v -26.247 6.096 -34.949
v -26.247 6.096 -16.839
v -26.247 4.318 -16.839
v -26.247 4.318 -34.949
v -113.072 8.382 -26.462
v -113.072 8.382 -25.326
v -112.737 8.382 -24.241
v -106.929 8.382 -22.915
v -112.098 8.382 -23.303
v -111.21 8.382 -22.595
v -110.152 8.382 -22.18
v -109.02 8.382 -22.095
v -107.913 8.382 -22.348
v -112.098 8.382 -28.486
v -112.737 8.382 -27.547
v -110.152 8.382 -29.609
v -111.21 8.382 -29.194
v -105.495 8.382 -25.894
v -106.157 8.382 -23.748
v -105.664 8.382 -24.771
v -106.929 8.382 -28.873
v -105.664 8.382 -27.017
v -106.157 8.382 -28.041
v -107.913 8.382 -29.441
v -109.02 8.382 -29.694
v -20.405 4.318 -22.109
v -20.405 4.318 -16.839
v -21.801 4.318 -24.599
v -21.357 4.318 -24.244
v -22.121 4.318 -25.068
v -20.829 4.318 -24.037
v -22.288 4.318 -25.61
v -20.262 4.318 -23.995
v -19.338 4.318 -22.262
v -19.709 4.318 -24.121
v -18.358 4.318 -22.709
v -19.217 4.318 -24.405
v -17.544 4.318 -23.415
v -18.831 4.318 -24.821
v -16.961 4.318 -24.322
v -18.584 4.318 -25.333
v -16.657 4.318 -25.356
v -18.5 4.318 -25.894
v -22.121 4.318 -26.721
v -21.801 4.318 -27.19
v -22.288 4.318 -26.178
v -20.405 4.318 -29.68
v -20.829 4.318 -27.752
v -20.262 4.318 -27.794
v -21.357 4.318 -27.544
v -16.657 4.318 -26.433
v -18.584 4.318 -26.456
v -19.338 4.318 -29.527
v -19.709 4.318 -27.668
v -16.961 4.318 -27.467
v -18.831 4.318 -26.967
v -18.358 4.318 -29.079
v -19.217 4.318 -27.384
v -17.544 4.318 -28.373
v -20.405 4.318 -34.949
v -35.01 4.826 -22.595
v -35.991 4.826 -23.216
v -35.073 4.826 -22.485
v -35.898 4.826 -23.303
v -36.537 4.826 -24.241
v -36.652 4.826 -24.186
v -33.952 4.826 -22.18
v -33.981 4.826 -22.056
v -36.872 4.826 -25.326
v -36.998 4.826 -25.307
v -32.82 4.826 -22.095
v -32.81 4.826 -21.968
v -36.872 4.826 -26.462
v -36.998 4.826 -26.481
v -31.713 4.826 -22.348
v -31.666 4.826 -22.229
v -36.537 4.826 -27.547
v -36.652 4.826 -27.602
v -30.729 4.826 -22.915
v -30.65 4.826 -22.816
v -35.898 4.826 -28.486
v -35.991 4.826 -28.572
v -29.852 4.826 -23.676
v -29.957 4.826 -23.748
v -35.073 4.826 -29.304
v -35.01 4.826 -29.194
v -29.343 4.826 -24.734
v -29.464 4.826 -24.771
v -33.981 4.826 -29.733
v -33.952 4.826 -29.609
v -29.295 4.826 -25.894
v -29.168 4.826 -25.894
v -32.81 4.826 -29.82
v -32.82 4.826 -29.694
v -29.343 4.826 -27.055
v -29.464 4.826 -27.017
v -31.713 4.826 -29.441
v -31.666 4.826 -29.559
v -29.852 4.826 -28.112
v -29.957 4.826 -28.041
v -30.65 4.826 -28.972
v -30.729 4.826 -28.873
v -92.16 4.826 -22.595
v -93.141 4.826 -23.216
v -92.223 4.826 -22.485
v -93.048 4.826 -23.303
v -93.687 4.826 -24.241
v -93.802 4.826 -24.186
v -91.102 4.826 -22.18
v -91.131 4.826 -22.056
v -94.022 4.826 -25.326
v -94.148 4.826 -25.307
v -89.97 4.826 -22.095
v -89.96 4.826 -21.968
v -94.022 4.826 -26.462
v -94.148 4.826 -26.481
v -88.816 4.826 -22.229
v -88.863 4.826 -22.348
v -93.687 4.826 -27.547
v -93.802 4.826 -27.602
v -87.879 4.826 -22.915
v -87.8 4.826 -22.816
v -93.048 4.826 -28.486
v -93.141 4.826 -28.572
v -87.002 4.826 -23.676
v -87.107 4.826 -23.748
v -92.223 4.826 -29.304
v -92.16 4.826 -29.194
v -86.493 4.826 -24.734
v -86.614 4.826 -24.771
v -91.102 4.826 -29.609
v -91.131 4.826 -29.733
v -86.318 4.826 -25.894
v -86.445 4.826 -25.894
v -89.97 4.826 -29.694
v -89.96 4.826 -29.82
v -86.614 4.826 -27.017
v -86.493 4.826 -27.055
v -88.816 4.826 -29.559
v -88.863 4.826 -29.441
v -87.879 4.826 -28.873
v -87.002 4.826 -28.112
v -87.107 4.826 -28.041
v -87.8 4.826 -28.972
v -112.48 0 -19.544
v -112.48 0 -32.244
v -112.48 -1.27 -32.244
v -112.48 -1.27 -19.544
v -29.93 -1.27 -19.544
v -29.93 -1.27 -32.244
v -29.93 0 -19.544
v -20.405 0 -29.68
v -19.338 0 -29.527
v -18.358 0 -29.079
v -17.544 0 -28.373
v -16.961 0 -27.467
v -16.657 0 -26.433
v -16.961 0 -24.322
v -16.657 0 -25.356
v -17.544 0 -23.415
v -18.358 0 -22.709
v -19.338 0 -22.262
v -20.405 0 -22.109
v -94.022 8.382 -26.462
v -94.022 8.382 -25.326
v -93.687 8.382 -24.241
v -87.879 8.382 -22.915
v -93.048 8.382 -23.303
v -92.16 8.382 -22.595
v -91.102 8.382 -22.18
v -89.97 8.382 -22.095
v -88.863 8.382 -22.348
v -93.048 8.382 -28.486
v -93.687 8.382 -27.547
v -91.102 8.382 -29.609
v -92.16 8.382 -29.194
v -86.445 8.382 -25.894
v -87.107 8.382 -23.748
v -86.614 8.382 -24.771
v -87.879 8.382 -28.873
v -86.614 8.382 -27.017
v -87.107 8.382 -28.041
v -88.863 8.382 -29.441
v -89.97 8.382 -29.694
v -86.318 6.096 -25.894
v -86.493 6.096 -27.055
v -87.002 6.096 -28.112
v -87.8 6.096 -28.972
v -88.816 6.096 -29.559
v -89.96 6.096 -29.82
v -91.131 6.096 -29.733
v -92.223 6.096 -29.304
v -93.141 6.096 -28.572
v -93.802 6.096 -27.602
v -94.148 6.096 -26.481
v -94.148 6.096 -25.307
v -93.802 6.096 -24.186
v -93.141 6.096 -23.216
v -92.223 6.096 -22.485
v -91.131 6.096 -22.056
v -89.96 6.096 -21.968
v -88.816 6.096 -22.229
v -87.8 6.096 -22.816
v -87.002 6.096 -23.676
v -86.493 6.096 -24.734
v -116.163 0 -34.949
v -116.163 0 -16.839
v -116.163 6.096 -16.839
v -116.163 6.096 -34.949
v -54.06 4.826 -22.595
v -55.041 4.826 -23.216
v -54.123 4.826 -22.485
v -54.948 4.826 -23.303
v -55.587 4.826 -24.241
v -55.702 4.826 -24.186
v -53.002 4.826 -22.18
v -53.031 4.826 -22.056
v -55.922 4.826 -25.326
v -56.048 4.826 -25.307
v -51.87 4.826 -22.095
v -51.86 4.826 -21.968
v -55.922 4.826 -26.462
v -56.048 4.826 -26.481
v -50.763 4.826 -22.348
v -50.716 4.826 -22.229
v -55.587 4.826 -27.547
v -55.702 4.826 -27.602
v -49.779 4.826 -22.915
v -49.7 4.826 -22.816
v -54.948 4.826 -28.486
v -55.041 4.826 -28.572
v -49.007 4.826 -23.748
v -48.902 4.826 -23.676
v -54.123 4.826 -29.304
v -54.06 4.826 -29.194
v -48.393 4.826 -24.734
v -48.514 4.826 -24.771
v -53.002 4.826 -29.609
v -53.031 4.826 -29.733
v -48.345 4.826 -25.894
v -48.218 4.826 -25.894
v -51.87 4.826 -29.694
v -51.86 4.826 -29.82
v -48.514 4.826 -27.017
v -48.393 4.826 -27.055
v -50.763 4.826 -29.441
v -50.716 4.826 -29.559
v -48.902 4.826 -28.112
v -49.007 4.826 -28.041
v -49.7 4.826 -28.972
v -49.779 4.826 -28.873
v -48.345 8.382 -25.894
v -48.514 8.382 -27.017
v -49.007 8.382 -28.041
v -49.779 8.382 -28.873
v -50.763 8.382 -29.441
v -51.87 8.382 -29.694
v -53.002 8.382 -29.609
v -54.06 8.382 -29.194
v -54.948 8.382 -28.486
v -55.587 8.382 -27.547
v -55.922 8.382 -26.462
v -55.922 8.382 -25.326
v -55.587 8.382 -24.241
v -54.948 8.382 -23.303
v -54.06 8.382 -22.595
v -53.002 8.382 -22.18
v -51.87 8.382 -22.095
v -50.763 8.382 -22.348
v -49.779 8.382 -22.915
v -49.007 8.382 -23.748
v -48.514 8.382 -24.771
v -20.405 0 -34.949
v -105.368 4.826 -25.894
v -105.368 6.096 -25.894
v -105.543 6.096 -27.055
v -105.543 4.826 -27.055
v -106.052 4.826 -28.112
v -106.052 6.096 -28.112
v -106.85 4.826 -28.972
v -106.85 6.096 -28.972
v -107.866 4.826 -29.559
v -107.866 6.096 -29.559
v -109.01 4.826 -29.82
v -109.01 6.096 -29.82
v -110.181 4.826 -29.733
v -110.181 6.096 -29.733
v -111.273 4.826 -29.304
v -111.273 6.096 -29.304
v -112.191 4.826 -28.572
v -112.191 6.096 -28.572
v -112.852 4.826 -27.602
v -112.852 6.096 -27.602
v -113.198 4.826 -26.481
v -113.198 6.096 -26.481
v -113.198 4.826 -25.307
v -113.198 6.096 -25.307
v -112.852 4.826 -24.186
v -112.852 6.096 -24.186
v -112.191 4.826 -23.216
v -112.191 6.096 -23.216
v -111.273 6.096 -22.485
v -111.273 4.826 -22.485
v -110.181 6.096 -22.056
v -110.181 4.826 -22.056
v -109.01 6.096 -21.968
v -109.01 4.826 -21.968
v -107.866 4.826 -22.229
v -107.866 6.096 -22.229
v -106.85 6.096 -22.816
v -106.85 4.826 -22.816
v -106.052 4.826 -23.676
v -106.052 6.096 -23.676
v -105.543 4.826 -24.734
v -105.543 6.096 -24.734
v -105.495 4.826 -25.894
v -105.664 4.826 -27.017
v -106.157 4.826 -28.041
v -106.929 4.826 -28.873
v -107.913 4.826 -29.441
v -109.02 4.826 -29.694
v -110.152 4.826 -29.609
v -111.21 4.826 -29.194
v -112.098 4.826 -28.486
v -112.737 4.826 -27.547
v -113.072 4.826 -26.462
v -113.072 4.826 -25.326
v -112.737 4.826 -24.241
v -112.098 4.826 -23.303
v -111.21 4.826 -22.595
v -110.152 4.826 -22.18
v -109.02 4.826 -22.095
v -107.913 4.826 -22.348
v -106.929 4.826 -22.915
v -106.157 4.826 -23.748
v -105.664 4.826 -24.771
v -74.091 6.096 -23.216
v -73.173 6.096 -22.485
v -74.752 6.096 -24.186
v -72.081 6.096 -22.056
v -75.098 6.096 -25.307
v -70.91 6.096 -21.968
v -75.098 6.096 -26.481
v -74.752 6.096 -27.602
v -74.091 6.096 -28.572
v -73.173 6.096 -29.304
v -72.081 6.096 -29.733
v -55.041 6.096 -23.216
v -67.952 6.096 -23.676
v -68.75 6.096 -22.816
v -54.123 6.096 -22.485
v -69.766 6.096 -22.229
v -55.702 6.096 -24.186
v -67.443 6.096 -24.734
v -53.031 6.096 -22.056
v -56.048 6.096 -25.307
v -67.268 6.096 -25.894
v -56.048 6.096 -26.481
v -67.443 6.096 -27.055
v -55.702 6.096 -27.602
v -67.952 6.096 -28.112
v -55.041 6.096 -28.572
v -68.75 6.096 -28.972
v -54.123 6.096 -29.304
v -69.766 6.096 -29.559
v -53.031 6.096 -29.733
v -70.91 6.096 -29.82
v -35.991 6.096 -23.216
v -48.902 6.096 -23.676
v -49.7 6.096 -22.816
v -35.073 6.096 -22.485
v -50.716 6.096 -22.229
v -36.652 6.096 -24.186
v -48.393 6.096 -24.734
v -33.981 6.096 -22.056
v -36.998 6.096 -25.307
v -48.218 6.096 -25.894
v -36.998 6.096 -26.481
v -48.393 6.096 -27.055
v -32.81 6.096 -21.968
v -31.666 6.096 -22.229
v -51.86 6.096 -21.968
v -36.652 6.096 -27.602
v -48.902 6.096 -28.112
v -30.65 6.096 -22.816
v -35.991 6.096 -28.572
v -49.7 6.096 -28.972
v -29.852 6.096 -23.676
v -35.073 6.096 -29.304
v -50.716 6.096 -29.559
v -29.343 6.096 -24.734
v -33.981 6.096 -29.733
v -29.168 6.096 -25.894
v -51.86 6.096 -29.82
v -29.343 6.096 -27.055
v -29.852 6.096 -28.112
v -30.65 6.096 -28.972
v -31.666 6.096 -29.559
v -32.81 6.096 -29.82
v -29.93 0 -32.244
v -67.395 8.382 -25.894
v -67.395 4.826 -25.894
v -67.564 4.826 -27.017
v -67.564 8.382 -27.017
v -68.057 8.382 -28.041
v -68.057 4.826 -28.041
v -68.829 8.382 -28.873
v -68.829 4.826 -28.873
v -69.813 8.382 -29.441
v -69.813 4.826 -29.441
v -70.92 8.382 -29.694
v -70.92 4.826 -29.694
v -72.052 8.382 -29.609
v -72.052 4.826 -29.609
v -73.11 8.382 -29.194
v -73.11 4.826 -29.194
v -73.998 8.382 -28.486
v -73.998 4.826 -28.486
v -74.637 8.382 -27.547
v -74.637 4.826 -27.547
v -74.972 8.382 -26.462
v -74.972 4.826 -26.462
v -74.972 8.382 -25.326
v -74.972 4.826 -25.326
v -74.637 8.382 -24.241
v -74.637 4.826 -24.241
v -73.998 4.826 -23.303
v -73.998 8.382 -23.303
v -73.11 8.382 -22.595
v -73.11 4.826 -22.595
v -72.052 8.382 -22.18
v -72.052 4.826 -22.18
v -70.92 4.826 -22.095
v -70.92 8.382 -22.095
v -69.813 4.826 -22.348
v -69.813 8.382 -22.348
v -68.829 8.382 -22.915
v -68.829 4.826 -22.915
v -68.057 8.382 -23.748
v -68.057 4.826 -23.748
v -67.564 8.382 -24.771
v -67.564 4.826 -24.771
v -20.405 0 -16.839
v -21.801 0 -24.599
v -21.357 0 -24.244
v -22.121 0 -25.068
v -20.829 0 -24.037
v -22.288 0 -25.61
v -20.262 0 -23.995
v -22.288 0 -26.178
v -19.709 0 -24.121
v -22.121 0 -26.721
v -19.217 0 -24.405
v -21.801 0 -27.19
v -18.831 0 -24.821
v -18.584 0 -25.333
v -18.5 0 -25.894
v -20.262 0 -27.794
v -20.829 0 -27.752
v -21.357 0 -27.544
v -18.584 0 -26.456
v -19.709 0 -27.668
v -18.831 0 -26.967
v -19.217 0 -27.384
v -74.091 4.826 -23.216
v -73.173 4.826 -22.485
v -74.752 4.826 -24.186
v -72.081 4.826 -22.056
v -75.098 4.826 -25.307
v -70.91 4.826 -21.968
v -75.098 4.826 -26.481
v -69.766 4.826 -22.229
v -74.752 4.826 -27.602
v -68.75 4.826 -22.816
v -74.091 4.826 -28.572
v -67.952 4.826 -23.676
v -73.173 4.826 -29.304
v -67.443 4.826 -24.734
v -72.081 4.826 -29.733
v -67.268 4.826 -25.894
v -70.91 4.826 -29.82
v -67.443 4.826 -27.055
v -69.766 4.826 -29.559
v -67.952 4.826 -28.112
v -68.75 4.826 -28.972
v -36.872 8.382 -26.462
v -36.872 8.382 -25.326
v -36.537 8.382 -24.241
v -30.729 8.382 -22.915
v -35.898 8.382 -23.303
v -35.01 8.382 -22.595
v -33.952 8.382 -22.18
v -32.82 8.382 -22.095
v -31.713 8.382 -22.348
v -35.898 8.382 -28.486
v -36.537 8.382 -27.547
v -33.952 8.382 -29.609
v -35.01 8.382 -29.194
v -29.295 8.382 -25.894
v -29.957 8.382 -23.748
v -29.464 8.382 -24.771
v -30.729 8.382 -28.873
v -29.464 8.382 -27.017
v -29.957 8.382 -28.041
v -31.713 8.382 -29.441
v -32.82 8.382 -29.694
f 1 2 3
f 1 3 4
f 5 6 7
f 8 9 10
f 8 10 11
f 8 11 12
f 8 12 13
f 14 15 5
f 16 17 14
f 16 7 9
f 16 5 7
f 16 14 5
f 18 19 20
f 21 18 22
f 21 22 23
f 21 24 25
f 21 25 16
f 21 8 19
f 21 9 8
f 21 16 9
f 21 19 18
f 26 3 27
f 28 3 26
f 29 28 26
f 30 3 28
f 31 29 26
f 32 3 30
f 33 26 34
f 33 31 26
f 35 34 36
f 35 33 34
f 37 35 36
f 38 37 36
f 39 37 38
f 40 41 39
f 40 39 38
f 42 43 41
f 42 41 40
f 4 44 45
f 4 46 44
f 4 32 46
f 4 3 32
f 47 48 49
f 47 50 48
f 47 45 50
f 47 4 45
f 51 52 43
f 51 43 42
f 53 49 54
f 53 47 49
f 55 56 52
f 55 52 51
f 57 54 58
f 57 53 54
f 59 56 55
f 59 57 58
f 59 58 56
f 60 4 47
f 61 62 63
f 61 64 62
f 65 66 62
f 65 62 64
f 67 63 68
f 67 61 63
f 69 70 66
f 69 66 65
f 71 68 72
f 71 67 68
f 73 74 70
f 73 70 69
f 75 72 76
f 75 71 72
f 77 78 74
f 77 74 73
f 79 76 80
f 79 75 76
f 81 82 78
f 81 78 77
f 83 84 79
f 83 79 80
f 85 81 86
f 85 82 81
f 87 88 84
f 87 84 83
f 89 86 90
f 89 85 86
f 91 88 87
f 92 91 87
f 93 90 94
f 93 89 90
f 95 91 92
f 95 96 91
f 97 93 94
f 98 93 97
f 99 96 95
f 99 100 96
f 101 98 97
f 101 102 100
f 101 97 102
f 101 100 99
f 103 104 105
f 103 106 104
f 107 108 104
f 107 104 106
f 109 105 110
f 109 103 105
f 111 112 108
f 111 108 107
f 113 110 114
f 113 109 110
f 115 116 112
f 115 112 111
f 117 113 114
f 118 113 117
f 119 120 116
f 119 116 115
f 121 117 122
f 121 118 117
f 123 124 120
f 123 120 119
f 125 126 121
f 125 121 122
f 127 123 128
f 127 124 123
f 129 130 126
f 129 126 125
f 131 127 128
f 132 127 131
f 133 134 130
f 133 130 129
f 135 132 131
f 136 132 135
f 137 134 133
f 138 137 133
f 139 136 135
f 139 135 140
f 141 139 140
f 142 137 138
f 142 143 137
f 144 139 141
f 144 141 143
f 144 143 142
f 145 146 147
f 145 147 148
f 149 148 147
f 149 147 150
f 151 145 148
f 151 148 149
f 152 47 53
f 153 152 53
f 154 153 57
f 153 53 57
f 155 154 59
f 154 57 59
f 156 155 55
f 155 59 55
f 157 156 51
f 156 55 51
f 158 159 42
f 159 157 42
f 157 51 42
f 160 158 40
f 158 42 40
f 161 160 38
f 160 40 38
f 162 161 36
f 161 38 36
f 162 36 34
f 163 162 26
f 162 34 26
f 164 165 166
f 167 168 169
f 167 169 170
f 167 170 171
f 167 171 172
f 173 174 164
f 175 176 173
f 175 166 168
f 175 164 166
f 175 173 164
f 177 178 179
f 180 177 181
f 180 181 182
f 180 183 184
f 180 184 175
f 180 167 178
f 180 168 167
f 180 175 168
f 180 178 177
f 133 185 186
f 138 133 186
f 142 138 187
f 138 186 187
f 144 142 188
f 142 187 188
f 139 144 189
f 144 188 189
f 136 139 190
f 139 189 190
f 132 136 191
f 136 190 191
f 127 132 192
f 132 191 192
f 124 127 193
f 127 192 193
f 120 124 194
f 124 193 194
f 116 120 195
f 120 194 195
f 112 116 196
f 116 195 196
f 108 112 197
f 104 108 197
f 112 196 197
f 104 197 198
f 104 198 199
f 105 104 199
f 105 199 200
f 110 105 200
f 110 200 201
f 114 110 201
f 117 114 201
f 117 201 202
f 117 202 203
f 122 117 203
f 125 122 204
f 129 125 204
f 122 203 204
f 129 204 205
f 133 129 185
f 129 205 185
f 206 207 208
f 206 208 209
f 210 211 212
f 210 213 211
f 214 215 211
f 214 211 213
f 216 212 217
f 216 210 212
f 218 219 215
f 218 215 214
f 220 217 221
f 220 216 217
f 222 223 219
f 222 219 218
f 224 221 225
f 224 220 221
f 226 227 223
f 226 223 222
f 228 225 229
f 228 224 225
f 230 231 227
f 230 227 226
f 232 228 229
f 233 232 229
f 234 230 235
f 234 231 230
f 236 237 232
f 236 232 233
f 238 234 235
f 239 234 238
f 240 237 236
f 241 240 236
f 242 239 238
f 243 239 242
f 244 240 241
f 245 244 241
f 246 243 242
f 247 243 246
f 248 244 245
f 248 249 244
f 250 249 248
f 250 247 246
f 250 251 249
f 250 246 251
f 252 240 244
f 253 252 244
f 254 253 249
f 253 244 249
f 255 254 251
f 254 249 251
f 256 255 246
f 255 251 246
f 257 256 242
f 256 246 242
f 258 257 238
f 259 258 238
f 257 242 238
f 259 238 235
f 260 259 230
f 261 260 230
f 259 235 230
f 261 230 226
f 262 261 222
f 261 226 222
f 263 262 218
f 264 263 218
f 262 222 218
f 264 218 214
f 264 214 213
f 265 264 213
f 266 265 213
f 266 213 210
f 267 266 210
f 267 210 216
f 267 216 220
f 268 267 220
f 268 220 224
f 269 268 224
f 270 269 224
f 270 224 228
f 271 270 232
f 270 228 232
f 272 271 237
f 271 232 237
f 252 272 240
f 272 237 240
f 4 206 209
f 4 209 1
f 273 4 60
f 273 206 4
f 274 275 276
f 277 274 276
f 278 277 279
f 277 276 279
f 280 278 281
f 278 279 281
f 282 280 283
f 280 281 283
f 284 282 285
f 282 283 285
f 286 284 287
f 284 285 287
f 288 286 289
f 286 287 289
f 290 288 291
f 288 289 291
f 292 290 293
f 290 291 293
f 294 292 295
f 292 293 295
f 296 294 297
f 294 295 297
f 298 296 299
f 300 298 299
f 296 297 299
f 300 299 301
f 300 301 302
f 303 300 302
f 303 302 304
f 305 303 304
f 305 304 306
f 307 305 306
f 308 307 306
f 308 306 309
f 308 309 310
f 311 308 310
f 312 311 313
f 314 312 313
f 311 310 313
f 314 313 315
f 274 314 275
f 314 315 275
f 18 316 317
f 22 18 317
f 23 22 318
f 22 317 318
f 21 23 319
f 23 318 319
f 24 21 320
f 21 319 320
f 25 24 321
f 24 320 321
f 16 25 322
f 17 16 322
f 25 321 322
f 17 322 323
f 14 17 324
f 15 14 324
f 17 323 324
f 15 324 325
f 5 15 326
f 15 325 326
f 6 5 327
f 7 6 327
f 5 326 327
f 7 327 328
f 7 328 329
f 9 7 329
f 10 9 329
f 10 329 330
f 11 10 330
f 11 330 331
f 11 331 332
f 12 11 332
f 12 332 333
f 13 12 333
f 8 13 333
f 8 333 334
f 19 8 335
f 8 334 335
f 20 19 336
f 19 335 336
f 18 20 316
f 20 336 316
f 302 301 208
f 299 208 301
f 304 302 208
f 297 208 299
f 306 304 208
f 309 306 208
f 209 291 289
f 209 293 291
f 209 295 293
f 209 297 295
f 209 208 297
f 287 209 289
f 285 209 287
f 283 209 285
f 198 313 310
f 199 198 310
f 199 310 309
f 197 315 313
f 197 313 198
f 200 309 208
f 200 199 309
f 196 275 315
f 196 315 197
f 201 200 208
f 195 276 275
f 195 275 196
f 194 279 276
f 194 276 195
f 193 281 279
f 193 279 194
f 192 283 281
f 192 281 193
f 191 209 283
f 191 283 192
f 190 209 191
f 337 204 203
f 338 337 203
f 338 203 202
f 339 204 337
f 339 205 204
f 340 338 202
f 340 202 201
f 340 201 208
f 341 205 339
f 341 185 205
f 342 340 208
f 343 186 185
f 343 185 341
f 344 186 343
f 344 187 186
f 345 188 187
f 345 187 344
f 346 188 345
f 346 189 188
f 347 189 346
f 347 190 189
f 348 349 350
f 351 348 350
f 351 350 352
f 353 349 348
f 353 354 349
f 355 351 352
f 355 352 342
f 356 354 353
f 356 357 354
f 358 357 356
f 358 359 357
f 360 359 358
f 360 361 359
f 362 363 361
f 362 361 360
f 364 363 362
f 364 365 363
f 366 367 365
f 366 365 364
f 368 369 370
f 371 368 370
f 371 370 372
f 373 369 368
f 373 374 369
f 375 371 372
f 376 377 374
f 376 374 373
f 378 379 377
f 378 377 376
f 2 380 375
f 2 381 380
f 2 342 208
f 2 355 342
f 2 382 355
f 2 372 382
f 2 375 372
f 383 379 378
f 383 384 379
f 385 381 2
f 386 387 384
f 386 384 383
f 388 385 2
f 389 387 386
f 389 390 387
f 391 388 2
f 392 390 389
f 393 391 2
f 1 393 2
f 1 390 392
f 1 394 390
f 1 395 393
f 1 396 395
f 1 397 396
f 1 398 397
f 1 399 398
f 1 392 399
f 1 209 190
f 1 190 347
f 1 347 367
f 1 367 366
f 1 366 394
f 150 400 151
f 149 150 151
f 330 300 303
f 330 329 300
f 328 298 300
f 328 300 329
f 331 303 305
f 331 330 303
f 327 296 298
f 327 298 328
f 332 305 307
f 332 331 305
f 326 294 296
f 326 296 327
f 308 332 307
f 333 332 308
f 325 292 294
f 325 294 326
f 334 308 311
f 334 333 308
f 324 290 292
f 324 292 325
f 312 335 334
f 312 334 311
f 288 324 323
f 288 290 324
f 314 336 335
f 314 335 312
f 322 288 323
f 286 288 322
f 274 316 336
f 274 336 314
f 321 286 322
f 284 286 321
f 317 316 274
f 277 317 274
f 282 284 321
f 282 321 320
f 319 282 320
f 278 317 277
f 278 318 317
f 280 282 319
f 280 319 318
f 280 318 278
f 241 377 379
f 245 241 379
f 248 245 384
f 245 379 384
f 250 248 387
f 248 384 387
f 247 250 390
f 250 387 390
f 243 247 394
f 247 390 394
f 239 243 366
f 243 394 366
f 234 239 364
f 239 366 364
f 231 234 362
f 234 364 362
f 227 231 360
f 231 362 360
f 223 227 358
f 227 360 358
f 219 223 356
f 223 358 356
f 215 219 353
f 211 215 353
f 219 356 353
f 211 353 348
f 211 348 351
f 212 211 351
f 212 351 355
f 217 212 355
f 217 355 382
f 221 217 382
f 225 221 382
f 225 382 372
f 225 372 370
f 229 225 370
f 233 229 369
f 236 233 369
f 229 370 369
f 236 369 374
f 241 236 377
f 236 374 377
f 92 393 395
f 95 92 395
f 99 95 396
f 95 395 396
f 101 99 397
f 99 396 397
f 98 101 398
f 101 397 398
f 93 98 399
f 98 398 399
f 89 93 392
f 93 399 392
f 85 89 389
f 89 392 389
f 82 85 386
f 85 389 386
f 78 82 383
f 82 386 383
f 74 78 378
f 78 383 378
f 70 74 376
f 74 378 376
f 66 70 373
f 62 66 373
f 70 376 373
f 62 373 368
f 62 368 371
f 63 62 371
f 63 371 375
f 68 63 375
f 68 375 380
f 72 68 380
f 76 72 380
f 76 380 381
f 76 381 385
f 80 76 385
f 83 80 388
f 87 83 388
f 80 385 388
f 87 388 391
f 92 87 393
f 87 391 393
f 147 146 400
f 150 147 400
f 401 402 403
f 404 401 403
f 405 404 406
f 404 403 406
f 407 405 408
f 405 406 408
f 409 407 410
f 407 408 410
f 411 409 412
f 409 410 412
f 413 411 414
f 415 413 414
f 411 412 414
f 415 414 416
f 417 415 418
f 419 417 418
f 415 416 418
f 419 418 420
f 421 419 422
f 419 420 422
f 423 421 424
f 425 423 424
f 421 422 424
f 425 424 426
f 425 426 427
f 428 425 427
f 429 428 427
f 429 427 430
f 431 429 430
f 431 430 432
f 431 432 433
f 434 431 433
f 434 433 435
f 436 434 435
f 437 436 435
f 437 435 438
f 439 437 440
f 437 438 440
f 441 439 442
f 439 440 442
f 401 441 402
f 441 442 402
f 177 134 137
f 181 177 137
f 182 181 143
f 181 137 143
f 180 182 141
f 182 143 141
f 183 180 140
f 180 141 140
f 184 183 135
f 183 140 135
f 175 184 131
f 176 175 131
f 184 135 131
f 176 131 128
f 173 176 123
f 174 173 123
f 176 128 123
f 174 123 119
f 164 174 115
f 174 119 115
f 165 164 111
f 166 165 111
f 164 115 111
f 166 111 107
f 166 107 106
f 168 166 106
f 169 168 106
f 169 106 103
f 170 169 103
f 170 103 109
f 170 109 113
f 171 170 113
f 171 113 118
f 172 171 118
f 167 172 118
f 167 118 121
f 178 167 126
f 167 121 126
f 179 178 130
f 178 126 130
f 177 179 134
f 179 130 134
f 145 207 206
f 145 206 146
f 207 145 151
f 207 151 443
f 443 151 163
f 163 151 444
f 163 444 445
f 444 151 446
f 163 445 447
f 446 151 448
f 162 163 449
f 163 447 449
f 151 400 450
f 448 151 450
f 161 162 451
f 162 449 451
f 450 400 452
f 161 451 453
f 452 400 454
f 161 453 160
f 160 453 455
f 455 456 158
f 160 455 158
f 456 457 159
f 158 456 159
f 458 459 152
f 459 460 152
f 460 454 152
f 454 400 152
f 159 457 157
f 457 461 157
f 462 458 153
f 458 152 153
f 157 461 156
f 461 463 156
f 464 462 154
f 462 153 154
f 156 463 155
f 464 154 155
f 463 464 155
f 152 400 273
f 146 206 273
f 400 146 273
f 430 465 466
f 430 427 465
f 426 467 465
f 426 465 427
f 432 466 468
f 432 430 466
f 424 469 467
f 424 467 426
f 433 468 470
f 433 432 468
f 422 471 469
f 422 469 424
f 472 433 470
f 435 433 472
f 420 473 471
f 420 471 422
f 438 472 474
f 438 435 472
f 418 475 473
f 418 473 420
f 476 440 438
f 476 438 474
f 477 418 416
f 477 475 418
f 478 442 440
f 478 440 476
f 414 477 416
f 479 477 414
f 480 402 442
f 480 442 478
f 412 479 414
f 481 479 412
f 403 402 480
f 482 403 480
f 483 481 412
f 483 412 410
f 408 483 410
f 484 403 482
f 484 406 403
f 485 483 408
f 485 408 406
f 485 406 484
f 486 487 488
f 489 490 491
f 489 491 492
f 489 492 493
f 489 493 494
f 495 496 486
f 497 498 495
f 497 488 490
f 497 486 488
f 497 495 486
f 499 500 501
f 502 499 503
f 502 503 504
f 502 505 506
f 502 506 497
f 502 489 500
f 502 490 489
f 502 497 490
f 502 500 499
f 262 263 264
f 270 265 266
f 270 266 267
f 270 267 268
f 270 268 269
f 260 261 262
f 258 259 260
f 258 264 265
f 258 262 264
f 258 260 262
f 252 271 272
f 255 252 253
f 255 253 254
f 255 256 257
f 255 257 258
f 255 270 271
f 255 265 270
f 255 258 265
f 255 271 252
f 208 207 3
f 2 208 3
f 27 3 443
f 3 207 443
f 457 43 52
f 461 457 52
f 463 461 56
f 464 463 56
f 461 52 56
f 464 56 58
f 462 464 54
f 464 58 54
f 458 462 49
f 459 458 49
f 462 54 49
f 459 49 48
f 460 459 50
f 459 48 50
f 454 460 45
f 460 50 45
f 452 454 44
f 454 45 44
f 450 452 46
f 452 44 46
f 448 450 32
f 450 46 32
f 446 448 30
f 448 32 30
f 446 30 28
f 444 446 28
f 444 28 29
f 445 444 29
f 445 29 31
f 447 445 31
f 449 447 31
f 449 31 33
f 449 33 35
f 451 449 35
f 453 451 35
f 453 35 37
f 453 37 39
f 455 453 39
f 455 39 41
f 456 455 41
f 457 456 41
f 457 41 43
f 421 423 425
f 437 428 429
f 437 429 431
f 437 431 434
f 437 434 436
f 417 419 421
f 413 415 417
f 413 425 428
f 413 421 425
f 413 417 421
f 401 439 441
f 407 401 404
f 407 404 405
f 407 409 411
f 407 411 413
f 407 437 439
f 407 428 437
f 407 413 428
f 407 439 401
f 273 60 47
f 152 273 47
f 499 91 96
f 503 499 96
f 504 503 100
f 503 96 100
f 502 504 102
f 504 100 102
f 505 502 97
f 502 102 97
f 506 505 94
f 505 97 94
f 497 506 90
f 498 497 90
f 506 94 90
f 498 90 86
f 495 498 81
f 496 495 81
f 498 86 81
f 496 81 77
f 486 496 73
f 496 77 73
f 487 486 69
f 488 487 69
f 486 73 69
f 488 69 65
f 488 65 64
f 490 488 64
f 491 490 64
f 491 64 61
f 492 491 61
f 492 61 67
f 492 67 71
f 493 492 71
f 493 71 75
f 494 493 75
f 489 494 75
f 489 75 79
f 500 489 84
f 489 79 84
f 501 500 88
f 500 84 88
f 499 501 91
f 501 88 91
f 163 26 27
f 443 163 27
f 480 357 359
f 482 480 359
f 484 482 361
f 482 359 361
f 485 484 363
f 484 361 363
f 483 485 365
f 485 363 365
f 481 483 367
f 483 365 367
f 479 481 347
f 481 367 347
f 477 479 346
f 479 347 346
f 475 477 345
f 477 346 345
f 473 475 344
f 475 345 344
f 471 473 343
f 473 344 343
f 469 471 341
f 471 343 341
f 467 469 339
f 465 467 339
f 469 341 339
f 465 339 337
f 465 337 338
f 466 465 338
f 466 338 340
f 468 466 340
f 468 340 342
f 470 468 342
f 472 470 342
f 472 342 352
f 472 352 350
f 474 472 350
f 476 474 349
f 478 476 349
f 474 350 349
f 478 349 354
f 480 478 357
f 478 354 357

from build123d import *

# Parameters (mm, degrees)
SKETCH1_W           = 99.568
SKETCH1_H           = 18.1102
BOSS_EXTRUDE1_DEPTH = 6.096
SKETCH2_W           = 9.652
SKETCH2_H           = 18.1102
CUT_EXTRUDE1_DEPTH  = 1.778
SKETCH3_R           = 1.905
CUT_EXTRUDE2_DEPTH  = 5.318
SKETCH4_R           = 3.937
CUT_EXTRUDE3_DEPTH  = 1.27
SKETCH5_W           = 82.55
SKETCH5_H           = 12.7
BOSS_EXTRUDE2_DEPTH = 1.27
CUT_EXTRUDE4_DEPTH  = 6.588
SKETCH8_R           = 3.81
BOSS_EXTRUDE3_DEPTH = 3.556


with BuildPart() as part:
    # Sketch1 → Boss-Extrude1 (new body)
    with BuildSketch(Plane(origin=(0, 0, 0), x_dir=(1, 0, 0), z_dir=(0, 1, 0))):
        with Locations((-66.378666667, 25.894273737)):
            Rectangle(SKETCH1_W, SKETCH1_H)
    extrude(amount=BOSS_EXTRUDE1_DEPTH)

    # Sketch2 → Cut-Extrude1 (cut)
    with BuildSketch(Plane(origin=(0, 6.096, 0), x_dir=(1, 0, 0), z_dir=(0, 1, 0))):
        with Locations((-21.420666667, 25.894273737)):
            Rectangle(SKETCH2_W, SKETCH2_H)
    extrude(amount=-CUT_EXTRUDE1_DEPTH, mode=Mode.SUBTRACT)

    # Sketch3 → Cut-Extrude2 (cut, through all)
    with BuildSketch(Plane(origin=(0, 4.318, 0), x_dir=(1, 0, 0), z_dir=(0, 1, 0))):
        with Locations((-20.404666667, 25.894273737)):
            Circle(SKETCH3_R)
    extrude(amount=-CUT_EXTRUDE2_DEPTH, mode=Mode.SUBTRACT)

    # Sketch4 → Cut-Extrude3 (cut)
    with BuildSketch(Plane(origin=(0, 6.096, 0), x_dir=(1, 0, 0), z_dir=(0, 1, 0))):
        with Locations((-33.104666667, 25.894273737)):
            Circle(SKETCH4_R)
        with Locations((-52.154666667, 25.894273737)):
            Circle(SKETCH4_R)
        with Locations((-71.204666667, 25.894273737)):
            Circle(SKETCH4_R)
        with Locations((-90.254666667, 25.894273737)):
            Circle(SKETCH4_R)
        with Locations((-109.304666667, 25.894273737)):
            Circle(SKETCH4_R)
    extrude(amount=-CUT_EXTRUDE3_DEPTH, mode=Mode.SUBTRACT)

    # Sketch5 → Boss-Extrude2 (add)
    with BuildSketch(Plane.XZ):
        with Locations((-71.204666667, -25.894273737)):
            Rectangle(SKETCH5_W, SKETCH5_H)
    extrude(amount=BOSS_EXTRUDE2_DEPTH)

    # Sketch7 → Cut-Extrude4 (cut, through all)
    with BuildSketch(Plane(origin=(0, 4.318, 0), x_dir=(1, 0, 0), z_dir=(0, 1, 0))):
        with BuildLine():
            Line((-16.594666667, 34.949373737), (-20.404666667, 34.949373737))
            Line((-20.404666667, 34.949373737), (-20.404666667, 29.680045052))
            ThreePointArc((-20.404666667, 29.680045052), (-16.618895352, 25.894273737), (-20.404666667, 22.108502422))
            Line((-20.404666667, 22.108502422), (-20.404666667, 16.839173737))
            Line((-20.404666667, 16.839173737), (-16.594666667, 16.839173737))
            Line((-16.594666667, 16.839173737), (-16.594666667, 34.949373737))
        make_face()
    extrude(amount=-CUT_EXTRUDE4_DEPTH, mode=Mode.SUBTRACT)

    # Sketch8 → Boss-Extrude3 (add)
    with BuildSketch(Plane(origin=(0, 4.826, 0), x_dir=(1, 0, 0), z_dir=(0, 1, 0))):
        with Locations((-33.104666667, 25.894273737)):
            Circle(SKETCH8_R)
        with Locations((-52.154666667, 25.894273737)):
            Circle(SKETCH8_R)
        with Locations((-71.204666667, 25.894273737)):
            Circle(SKETCH8_R)
        with Locations((-90.254666667, 25.894273737)):
            Circle(SKETCH8_R)
        with Locations((-109.304666667, 25.894273737)):
            Circle(SKETCH8_R)
    extrude(amount=BOSS_EXTRUDE3_DEPTH)


solid = part.part
